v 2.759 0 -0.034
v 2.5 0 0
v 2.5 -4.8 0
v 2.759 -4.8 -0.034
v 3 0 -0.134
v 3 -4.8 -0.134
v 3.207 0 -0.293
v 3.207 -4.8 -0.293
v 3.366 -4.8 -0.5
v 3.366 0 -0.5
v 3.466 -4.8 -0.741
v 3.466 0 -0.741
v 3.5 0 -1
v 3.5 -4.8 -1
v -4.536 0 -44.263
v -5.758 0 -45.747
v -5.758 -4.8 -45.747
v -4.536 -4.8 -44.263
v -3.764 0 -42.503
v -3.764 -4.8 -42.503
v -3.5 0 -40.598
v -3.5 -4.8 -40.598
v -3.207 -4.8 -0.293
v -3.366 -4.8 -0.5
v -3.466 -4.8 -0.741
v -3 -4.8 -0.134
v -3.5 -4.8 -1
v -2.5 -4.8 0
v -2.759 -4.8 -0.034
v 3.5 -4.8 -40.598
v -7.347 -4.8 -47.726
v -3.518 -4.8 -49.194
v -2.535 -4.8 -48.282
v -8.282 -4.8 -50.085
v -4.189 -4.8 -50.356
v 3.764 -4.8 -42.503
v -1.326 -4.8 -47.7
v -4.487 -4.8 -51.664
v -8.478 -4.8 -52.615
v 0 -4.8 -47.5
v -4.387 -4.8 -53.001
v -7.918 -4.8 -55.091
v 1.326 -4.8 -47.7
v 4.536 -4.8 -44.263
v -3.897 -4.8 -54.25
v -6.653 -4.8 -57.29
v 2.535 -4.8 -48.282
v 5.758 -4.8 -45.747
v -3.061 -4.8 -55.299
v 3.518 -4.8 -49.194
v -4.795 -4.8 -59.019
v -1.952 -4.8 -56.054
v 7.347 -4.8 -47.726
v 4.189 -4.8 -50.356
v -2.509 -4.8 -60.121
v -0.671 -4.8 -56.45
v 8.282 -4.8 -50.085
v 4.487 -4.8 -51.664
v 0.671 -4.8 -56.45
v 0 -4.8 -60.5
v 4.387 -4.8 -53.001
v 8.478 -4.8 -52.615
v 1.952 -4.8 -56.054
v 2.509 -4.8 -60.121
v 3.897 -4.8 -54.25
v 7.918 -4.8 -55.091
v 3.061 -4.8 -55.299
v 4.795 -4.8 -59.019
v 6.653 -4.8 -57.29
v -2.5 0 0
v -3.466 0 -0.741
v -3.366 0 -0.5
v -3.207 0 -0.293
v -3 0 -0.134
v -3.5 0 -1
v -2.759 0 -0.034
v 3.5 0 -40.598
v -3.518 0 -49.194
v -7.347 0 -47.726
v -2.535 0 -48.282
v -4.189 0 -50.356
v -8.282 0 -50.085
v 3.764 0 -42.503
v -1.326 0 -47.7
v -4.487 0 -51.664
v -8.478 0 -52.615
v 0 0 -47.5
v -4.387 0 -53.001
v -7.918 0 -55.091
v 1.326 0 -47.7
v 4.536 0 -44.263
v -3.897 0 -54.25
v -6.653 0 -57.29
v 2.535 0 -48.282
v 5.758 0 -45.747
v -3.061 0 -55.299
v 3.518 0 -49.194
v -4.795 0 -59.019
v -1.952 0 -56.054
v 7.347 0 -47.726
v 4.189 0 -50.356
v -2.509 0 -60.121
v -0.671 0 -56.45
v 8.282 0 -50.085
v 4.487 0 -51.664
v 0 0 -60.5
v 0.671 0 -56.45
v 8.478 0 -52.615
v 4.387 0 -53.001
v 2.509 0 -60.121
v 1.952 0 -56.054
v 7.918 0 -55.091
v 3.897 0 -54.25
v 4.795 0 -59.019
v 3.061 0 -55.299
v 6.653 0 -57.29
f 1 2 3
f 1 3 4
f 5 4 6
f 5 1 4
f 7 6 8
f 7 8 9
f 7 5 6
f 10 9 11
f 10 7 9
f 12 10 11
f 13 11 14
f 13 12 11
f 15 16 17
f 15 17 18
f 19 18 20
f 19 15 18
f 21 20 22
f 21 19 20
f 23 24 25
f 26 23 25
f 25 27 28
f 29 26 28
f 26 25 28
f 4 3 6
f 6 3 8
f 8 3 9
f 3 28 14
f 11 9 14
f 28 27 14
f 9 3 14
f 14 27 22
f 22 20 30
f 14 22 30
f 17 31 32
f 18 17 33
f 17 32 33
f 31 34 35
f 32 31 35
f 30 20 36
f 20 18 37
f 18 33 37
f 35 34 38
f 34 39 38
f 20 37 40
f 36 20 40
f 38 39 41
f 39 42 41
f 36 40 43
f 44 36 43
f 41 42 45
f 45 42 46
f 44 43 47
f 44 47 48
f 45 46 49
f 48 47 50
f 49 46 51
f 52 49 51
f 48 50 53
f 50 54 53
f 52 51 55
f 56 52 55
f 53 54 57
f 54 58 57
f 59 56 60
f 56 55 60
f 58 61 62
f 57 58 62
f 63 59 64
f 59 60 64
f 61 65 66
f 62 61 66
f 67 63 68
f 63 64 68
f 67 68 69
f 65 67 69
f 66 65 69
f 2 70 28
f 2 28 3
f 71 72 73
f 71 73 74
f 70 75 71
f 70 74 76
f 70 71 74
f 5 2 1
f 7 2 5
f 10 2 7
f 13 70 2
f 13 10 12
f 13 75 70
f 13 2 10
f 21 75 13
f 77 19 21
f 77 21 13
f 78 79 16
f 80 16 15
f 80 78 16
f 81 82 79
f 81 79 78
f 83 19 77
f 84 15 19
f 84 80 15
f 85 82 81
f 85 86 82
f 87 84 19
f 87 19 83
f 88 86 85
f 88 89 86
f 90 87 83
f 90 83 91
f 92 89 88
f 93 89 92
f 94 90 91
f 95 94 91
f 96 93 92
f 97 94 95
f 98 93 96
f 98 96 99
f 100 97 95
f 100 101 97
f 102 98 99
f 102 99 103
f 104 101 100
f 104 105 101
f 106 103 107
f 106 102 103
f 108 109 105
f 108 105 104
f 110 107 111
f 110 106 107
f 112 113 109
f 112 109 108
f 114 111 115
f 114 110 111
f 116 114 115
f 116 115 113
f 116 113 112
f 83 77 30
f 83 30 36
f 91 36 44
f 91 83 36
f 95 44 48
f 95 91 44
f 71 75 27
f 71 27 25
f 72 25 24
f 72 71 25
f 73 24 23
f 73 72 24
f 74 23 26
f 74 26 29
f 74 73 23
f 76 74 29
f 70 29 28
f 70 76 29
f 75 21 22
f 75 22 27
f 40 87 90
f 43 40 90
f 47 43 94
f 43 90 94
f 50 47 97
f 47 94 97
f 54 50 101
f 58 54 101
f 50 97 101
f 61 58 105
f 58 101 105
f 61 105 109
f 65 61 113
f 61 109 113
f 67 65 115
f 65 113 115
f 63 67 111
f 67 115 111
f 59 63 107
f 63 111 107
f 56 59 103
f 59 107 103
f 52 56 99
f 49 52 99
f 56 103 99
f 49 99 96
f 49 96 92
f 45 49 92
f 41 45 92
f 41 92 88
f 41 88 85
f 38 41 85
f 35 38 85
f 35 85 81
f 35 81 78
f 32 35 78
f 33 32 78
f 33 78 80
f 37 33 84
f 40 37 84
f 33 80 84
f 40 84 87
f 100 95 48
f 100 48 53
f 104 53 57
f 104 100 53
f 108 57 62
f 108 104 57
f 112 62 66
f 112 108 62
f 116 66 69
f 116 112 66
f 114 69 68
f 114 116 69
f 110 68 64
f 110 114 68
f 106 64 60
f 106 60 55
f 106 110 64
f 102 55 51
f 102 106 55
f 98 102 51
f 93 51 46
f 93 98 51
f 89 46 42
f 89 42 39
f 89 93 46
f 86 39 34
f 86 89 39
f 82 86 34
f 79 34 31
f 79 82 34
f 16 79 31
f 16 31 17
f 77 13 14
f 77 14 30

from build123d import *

# Parameters (mm, degrees)
ESBO_O1_R          = 4.5
FLANGE_BASE1_DEPTH = 4.8


# Sheet-metal steps are written as plain solids
with BuildPart() as part:
    # Esboço1 → Flange-base1 (new body)
    with BuildSketch(Plane(origin=(0, 0, 0), x_dir=(1, 0, 0), z_dir=(0, 1, 0))):
        with BuildLine():
            Line((-3.5, 40.598245749), (-3.5, 1))
            ThreePointArc((-3.5, 1), (-3.207106781, 0.292893219), (-2.5, 0))
            Line((-2.5, 0), (2.5, 0))
            ThreePointArc((2.5, 0), (3.207106781, 0.292893219), (3.5, 1))
            Line((3.5, 1), (3.5, 40.598245749))
            ThreePointArc((3.5, 40.598245749), (4.089323422, 43.4095134), (5.758064516, 45.747425088))
            ThreePointArc((5.758064516, 45.747425088), (0, 60.5), (-5.758064516, 45.747425088))
            ThreePointArc((-5.758064516, 45.747425088), (-4.089323422, 43.4095134), (-3.5, 40.598245749))
        make_face()
        with Locations(Location((0, 52, 0), (0, 0, 270))):
            Circle(ESBO_O1_R, mode=Mode.SUBTRACT)
    extrude(amount=-FLANGE_BASE1_DEPTH)


solid = part.part
